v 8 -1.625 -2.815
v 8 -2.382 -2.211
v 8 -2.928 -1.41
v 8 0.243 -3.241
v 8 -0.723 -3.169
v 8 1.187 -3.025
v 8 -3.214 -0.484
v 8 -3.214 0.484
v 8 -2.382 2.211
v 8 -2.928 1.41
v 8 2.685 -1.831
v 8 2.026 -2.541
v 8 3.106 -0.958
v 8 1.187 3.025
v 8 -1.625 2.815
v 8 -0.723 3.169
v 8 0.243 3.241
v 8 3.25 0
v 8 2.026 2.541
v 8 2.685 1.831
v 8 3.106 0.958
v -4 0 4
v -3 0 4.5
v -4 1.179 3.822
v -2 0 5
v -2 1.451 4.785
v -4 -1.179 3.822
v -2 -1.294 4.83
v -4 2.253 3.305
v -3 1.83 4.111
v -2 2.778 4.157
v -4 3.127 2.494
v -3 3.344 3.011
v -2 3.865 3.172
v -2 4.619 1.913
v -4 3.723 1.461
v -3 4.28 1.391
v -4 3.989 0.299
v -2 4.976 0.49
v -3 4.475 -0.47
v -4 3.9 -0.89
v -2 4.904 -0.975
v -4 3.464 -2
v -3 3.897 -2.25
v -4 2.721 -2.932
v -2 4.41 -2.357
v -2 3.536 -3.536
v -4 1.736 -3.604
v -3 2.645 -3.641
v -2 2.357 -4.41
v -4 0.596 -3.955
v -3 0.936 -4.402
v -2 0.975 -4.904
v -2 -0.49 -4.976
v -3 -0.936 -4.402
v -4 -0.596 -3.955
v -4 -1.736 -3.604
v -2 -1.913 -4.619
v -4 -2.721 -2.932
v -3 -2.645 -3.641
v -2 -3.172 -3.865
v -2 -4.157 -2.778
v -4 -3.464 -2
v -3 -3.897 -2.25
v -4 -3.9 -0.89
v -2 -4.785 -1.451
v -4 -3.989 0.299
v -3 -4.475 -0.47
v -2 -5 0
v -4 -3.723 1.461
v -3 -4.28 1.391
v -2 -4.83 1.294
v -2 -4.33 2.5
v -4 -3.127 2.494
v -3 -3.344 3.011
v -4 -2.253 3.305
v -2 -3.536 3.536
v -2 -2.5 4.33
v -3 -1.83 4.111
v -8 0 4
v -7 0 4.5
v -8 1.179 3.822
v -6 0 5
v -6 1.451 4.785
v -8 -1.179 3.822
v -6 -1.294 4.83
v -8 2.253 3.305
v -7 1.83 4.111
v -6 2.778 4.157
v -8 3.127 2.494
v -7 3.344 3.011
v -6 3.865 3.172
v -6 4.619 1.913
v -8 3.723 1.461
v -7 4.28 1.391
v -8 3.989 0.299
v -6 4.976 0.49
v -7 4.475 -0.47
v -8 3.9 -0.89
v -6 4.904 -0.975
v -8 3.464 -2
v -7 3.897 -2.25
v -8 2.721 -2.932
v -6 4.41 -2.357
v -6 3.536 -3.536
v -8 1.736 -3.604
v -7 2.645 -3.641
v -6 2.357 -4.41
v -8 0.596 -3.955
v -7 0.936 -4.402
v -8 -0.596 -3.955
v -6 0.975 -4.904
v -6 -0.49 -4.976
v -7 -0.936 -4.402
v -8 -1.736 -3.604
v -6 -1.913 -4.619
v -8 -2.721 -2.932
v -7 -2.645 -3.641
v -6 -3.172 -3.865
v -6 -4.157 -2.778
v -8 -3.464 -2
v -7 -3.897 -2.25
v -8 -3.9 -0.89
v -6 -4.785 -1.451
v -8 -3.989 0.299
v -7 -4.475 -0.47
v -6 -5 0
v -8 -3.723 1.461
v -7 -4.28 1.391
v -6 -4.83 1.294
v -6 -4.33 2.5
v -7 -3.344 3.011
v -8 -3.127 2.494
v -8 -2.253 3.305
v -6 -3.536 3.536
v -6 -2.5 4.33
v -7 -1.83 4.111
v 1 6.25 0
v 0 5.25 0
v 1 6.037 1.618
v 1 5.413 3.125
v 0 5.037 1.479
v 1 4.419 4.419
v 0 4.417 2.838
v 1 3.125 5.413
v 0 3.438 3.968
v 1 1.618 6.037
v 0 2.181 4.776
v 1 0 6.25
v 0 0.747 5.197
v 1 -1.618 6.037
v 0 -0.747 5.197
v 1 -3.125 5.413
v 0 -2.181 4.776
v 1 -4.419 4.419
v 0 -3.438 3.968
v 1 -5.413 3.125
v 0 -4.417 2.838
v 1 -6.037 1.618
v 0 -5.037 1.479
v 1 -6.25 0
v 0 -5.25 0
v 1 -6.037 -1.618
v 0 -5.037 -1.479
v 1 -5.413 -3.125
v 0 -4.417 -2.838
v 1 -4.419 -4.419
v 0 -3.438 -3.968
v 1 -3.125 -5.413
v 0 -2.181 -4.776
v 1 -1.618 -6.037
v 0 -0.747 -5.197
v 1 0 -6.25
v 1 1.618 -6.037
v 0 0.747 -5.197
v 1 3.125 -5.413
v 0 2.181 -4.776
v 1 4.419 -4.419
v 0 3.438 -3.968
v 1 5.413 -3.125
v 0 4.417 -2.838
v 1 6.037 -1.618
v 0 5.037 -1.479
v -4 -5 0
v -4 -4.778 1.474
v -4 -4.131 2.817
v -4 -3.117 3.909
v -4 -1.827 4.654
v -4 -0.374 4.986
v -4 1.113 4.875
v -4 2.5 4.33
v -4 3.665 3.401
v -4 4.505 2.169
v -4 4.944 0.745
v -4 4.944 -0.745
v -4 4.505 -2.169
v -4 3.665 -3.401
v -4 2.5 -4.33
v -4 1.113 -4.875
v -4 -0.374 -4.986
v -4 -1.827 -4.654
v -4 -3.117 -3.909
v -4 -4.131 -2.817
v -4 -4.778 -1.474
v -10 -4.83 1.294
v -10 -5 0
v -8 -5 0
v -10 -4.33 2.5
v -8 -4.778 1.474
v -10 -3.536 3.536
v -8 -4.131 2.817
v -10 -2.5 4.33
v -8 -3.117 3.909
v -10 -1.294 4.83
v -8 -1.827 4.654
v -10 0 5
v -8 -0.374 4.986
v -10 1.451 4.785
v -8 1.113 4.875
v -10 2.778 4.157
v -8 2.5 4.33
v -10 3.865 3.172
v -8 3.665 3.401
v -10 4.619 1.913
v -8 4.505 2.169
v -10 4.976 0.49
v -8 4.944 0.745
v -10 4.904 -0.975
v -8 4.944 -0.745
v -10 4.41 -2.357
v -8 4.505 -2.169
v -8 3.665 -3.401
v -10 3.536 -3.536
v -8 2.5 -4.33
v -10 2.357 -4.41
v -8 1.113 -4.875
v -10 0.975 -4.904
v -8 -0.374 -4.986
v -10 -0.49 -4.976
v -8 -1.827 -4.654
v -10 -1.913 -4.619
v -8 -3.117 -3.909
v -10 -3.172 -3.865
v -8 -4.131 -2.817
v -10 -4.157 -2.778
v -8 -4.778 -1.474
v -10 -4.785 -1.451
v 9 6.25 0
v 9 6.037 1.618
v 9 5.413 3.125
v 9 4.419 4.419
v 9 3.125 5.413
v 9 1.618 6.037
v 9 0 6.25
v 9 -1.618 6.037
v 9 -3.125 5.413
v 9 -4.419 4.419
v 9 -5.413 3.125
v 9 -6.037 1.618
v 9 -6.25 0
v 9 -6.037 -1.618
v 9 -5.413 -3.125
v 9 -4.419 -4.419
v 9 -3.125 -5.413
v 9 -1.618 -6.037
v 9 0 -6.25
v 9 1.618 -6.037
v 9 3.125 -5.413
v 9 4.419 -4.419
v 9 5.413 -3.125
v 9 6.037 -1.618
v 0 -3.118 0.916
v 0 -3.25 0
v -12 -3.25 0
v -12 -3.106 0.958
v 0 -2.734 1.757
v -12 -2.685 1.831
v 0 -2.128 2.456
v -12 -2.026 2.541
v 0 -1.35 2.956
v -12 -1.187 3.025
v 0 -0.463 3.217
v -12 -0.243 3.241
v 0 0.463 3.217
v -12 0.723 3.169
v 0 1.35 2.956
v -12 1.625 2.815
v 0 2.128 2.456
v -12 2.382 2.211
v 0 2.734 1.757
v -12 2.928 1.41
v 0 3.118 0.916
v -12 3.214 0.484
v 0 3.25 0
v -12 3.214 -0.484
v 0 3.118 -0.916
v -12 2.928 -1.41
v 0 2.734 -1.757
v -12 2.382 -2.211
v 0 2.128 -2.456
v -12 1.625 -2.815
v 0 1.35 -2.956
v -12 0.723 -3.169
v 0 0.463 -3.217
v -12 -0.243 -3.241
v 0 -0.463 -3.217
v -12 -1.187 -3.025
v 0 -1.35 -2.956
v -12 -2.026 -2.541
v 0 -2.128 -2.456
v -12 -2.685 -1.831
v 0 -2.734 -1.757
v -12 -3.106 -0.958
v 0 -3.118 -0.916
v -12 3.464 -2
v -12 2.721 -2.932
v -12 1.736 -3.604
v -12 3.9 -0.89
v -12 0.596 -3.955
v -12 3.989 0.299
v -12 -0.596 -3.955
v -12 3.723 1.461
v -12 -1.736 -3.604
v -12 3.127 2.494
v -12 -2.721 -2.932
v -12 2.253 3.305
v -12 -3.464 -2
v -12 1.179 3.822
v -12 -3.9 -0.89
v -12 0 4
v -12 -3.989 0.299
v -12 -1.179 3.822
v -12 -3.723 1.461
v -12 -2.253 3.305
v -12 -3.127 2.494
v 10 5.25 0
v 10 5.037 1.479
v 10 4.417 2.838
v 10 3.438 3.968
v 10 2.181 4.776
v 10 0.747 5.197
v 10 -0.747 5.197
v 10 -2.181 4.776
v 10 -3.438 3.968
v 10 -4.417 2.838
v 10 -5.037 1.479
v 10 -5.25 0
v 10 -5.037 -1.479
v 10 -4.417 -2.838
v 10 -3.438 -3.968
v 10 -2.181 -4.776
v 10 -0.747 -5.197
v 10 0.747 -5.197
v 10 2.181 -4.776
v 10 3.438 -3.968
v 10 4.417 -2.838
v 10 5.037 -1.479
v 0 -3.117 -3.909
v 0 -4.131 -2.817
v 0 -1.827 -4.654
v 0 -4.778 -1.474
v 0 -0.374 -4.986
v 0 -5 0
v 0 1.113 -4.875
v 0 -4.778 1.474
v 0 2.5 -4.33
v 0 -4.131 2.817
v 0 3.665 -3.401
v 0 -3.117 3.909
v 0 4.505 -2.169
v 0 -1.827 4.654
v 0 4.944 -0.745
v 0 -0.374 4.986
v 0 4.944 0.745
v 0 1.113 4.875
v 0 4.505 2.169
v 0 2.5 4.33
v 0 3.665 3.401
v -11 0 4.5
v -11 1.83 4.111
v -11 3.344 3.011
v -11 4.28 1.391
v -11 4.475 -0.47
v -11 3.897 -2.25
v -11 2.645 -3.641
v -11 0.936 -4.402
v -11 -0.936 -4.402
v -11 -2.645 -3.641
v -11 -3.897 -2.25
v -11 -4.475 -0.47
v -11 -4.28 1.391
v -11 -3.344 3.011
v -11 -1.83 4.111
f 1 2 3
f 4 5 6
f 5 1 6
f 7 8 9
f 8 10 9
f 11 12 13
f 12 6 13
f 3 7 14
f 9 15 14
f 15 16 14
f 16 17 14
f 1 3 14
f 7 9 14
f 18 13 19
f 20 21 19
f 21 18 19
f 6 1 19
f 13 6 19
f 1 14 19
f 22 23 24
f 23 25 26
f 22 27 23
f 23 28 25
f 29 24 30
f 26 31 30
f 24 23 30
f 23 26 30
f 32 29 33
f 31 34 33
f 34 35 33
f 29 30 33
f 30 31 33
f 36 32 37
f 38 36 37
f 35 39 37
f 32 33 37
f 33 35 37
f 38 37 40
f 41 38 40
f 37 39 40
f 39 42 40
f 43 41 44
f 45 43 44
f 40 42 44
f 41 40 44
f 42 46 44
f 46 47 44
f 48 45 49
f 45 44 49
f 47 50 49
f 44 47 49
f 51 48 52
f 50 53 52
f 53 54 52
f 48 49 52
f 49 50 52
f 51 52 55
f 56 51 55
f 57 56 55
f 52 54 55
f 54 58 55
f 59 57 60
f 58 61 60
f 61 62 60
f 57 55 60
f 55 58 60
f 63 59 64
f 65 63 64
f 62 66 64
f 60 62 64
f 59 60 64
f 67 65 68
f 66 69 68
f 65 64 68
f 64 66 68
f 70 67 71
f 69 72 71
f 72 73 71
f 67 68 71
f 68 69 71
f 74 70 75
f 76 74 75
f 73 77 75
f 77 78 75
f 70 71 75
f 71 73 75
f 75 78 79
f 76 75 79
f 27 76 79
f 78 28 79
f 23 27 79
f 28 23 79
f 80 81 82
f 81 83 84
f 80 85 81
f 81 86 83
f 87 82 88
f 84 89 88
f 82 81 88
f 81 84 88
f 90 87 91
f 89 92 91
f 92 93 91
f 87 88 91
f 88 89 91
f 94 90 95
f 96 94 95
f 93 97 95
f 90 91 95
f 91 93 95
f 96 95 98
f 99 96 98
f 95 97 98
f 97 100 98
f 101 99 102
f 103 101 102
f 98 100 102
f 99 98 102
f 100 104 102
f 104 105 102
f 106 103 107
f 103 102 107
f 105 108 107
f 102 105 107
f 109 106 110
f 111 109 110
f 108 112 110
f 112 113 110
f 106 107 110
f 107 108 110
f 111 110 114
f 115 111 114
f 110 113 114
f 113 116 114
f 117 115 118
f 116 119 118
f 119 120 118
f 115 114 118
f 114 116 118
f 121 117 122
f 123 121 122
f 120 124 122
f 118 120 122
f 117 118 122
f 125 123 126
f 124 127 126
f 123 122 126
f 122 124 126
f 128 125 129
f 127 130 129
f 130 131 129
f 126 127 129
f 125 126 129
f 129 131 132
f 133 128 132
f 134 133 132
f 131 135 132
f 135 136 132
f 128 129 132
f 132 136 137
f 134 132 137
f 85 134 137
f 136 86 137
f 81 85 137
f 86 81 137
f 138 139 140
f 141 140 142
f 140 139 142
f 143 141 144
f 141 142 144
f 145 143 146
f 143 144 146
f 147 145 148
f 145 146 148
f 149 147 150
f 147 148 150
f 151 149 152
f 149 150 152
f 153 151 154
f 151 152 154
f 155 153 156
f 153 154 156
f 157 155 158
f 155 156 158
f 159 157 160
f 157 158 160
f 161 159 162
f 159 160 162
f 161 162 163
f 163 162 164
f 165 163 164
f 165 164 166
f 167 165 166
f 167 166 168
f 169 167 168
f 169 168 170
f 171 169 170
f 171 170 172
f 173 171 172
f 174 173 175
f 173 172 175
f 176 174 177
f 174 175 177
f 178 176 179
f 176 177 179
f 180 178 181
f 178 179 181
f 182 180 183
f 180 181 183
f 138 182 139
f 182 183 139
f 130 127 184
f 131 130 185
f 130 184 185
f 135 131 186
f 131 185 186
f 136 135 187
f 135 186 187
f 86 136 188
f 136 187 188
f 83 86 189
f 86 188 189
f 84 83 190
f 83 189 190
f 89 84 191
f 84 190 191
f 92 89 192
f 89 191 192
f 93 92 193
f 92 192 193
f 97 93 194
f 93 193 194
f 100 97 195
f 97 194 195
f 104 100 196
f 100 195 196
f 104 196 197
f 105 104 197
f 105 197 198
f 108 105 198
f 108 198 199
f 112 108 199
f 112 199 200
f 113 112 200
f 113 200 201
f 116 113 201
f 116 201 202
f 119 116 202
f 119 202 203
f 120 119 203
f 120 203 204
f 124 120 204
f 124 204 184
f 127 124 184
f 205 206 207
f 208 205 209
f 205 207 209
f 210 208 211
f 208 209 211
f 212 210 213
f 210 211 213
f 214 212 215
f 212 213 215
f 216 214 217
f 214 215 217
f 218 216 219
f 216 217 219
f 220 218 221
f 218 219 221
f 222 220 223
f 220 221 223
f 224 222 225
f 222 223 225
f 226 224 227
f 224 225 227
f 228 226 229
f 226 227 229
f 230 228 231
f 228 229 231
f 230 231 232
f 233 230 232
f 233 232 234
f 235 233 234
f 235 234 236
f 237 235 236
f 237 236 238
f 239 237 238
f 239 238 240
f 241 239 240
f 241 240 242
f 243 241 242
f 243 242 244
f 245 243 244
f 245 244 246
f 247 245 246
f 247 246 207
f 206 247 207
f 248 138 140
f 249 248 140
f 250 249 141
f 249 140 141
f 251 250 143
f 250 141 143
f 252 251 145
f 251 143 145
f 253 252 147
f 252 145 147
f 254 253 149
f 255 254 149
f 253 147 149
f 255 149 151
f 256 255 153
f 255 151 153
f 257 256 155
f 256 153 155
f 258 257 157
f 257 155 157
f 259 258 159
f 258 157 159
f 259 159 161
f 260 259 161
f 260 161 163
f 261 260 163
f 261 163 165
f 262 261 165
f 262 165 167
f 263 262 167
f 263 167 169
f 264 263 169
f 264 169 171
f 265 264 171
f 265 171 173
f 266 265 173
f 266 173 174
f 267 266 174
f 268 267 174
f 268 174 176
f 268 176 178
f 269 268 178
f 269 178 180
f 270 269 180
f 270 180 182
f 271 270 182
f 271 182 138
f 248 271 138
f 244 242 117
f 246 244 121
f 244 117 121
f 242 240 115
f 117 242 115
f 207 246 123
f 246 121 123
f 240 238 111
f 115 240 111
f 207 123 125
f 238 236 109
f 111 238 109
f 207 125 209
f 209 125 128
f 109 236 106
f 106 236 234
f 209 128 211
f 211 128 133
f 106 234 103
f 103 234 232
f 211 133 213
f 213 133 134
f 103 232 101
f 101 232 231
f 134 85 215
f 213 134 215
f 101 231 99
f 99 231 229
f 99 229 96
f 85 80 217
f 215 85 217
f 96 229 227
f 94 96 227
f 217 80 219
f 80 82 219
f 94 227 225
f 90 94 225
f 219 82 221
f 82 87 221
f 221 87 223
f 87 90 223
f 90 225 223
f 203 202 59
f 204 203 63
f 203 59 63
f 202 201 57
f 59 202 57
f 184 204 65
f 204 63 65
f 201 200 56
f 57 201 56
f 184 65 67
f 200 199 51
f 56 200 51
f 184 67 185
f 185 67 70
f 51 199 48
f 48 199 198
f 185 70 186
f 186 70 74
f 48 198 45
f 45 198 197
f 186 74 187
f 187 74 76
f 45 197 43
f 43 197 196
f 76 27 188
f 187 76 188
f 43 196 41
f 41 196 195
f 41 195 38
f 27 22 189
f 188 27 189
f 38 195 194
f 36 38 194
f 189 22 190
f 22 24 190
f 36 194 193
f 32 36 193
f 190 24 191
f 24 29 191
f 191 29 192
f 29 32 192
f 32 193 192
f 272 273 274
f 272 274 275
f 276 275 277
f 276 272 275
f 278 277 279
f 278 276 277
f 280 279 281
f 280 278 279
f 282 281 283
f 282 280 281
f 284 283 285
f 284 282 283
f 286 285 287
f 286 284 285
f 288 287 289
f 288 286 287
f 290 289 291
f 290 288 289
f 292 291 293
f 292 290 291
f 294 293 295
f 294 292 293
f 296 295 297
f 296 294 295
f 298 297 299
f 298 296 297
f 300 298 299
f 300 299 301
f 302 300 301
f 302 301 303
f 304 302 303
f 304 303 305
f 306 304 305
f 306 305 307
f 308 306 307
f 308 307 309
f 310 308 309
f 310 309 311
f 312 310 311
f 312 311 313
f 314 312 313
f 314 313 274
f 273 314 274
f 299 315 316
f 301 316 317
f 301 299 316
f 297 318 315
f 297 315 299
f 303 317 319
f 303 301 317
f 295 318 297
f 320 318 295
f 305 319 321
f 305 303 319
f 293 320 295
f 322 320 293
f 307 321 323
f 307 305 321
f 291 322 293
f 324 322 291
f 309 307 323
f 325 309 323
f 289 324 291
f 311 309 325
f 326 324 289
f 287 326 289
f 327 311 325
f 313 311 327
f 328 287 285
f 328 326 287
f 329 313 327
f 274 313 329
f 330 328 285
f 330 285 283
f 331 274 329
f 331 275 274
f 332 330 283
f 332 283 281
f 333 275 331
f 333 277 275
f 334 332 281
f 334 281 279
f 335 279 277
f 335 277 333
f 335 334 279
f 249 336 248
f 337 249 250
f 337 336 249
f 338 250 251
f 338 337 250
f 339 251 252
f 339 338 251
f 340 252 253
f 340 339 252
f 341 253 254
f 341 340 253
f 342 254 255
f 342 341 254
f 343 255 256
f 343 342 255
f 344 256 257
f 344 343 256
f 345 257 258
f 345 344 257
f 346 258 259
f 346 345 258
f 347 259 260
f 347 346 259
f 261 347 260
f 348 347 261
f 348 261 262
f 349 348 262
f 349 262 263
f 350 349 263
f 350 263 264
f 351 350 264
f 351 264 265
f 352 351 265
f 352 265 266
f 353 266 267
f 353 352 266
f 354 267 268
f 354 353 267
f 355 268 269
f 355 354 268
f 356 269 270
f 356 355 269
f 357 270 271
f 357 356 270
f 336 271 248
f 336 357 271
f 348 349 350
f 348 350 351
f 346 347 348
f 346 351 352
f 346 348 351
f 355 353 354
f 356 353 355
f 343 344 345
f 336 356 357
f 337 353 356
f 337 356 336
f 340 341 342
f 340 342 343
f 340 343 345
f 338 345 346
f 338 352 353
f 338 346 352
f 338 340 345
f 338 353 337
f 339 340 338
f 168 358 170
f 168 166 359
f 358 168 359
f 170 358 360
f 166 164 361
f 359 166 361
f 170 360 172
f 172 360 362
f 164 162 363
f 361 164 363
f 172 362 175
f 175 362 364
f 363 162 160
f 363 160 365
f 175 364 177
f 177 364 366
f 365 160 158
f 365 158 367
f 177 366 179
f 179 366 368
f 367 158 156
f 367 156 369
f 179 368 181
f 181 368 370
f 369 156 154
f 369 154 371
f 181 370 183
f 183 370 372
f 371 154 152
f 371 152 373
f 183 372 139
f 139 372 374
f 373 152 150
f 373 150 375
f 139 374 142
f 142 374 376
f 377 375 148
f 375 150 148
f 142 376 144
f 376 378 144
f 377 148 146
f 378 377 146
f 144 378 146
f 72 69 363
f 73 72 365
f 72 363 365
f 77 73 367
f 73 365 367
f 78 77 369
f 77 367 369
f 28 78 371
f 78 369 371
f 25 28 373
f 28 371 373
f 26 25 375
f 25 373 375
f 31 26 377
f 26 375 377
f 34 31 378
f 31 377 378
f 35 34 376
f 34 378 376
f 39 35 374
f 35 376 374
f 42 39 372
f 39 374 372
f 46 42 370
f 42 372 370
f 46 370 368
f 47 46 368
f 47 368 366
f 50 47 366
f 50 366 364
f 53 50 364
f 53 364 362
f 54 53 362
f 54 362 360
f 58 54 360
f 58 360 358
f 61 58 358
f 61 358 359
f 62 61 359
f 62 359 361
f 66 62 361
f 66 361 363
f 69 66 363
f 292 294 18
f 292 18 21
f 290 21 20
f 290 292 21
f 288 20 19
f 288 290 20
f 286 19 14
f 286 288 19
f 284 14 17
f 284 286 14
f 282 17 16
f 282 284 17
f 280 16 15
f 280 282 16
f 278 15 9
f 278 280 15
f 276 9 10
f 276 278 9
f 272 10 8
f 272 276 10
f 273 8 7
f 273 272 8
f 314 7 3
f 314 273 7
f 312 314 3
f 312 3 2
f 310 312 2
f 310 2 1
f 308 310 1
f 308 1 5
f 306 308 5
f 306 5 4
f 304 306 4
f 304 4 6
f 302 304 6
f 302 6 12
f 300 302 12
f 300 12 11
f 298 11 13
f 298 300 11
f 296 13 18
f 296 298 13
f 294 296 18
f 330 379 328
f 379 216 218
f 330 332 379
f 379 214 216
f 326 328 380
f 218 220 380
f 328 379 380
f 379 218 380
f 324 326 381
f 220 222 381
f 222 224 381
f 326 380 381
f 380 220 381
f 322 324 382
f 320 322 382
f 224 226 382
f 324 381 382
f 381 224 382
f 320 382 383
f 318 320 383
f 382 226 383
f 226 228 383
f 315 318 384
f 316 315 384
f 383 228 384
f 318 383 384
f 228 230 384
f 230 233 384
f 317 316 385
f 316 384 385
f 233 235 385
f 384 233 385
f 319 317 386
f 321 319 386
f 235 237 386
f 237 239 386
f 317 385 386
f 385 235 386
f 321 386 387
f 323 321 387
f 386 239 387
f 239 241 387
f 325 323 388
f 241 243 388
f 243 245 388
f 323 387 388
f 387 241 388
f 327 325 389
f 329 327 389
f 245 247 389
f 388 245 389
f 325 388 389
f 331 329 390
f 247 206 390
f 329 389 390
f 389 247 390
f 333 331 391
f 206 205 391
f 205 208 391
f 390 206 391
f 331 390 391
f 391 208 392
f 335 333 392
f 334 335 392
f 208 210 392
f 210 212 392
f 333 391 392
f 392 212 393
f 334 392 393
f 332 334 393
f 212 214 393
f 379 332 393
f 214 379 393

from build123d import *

# Parameters (mm, degrees)
F0_R     = 6.25
F0_R_2   = 3.25
F1_DEPTH = 10
F2_R     = 5
F2_R_2   = 3.25
F3_DEPTH = 12
F6_R     = 6.25
F7_DEPTH = 2
F8_SIZE  = 1


with BuildPart() as f1:
    # F0 (on Right) → F1 (new body)
    with BuildSketch(Plane.YZ):
        Circle(F0_R)
        Circle(F0_R_2, mode=Mode.SUBTRACT)
    extrude(amount=F1_DEPTH)

    # F2 (on face) → F3 (join)
    with BuildSketch(Plane(origin=(0, 0, 0), x_dir=(0, -1, 0), z_dir=(-1, 0, 0))):
        Circle(F2_R)
        Circle(F2_R_2, mode=Mode.SUBTRACT)
    extrude(amount=F3_DEPTH)

    # F4 (on Front) → F5 (revolve, cut)
    with BuildSketch(Plane.XZ):
        Polygon((-10, 5), (-12, 5), (-12, 4), align=None)
        Polygon((-8, 4), (-6, 5), (-8, 5), align=None)
        Polygon((-4, 4), (-2, 5), (-4, 5), align=None)
    revolve(axis=Axis((-10, 0, 0), (-1, 0, 0)), mode=Mode.SUBTRACT)

    # F6 (on face) → F7 (join)
    with BuildSketch(Plane.YZ.offset(10)):
        Circle(F6_R)
    extrude(amount=-F7_DEPTH)

    # F8
    f8_edges = [f1.edges().sort_by_distance(p)[0] for p in [
        (10, -6.25, 0),
        (0, -6.25, 0),
    ]]
    chamfer(f8_edges, length=F8_SIZE)


solid = f1.part
